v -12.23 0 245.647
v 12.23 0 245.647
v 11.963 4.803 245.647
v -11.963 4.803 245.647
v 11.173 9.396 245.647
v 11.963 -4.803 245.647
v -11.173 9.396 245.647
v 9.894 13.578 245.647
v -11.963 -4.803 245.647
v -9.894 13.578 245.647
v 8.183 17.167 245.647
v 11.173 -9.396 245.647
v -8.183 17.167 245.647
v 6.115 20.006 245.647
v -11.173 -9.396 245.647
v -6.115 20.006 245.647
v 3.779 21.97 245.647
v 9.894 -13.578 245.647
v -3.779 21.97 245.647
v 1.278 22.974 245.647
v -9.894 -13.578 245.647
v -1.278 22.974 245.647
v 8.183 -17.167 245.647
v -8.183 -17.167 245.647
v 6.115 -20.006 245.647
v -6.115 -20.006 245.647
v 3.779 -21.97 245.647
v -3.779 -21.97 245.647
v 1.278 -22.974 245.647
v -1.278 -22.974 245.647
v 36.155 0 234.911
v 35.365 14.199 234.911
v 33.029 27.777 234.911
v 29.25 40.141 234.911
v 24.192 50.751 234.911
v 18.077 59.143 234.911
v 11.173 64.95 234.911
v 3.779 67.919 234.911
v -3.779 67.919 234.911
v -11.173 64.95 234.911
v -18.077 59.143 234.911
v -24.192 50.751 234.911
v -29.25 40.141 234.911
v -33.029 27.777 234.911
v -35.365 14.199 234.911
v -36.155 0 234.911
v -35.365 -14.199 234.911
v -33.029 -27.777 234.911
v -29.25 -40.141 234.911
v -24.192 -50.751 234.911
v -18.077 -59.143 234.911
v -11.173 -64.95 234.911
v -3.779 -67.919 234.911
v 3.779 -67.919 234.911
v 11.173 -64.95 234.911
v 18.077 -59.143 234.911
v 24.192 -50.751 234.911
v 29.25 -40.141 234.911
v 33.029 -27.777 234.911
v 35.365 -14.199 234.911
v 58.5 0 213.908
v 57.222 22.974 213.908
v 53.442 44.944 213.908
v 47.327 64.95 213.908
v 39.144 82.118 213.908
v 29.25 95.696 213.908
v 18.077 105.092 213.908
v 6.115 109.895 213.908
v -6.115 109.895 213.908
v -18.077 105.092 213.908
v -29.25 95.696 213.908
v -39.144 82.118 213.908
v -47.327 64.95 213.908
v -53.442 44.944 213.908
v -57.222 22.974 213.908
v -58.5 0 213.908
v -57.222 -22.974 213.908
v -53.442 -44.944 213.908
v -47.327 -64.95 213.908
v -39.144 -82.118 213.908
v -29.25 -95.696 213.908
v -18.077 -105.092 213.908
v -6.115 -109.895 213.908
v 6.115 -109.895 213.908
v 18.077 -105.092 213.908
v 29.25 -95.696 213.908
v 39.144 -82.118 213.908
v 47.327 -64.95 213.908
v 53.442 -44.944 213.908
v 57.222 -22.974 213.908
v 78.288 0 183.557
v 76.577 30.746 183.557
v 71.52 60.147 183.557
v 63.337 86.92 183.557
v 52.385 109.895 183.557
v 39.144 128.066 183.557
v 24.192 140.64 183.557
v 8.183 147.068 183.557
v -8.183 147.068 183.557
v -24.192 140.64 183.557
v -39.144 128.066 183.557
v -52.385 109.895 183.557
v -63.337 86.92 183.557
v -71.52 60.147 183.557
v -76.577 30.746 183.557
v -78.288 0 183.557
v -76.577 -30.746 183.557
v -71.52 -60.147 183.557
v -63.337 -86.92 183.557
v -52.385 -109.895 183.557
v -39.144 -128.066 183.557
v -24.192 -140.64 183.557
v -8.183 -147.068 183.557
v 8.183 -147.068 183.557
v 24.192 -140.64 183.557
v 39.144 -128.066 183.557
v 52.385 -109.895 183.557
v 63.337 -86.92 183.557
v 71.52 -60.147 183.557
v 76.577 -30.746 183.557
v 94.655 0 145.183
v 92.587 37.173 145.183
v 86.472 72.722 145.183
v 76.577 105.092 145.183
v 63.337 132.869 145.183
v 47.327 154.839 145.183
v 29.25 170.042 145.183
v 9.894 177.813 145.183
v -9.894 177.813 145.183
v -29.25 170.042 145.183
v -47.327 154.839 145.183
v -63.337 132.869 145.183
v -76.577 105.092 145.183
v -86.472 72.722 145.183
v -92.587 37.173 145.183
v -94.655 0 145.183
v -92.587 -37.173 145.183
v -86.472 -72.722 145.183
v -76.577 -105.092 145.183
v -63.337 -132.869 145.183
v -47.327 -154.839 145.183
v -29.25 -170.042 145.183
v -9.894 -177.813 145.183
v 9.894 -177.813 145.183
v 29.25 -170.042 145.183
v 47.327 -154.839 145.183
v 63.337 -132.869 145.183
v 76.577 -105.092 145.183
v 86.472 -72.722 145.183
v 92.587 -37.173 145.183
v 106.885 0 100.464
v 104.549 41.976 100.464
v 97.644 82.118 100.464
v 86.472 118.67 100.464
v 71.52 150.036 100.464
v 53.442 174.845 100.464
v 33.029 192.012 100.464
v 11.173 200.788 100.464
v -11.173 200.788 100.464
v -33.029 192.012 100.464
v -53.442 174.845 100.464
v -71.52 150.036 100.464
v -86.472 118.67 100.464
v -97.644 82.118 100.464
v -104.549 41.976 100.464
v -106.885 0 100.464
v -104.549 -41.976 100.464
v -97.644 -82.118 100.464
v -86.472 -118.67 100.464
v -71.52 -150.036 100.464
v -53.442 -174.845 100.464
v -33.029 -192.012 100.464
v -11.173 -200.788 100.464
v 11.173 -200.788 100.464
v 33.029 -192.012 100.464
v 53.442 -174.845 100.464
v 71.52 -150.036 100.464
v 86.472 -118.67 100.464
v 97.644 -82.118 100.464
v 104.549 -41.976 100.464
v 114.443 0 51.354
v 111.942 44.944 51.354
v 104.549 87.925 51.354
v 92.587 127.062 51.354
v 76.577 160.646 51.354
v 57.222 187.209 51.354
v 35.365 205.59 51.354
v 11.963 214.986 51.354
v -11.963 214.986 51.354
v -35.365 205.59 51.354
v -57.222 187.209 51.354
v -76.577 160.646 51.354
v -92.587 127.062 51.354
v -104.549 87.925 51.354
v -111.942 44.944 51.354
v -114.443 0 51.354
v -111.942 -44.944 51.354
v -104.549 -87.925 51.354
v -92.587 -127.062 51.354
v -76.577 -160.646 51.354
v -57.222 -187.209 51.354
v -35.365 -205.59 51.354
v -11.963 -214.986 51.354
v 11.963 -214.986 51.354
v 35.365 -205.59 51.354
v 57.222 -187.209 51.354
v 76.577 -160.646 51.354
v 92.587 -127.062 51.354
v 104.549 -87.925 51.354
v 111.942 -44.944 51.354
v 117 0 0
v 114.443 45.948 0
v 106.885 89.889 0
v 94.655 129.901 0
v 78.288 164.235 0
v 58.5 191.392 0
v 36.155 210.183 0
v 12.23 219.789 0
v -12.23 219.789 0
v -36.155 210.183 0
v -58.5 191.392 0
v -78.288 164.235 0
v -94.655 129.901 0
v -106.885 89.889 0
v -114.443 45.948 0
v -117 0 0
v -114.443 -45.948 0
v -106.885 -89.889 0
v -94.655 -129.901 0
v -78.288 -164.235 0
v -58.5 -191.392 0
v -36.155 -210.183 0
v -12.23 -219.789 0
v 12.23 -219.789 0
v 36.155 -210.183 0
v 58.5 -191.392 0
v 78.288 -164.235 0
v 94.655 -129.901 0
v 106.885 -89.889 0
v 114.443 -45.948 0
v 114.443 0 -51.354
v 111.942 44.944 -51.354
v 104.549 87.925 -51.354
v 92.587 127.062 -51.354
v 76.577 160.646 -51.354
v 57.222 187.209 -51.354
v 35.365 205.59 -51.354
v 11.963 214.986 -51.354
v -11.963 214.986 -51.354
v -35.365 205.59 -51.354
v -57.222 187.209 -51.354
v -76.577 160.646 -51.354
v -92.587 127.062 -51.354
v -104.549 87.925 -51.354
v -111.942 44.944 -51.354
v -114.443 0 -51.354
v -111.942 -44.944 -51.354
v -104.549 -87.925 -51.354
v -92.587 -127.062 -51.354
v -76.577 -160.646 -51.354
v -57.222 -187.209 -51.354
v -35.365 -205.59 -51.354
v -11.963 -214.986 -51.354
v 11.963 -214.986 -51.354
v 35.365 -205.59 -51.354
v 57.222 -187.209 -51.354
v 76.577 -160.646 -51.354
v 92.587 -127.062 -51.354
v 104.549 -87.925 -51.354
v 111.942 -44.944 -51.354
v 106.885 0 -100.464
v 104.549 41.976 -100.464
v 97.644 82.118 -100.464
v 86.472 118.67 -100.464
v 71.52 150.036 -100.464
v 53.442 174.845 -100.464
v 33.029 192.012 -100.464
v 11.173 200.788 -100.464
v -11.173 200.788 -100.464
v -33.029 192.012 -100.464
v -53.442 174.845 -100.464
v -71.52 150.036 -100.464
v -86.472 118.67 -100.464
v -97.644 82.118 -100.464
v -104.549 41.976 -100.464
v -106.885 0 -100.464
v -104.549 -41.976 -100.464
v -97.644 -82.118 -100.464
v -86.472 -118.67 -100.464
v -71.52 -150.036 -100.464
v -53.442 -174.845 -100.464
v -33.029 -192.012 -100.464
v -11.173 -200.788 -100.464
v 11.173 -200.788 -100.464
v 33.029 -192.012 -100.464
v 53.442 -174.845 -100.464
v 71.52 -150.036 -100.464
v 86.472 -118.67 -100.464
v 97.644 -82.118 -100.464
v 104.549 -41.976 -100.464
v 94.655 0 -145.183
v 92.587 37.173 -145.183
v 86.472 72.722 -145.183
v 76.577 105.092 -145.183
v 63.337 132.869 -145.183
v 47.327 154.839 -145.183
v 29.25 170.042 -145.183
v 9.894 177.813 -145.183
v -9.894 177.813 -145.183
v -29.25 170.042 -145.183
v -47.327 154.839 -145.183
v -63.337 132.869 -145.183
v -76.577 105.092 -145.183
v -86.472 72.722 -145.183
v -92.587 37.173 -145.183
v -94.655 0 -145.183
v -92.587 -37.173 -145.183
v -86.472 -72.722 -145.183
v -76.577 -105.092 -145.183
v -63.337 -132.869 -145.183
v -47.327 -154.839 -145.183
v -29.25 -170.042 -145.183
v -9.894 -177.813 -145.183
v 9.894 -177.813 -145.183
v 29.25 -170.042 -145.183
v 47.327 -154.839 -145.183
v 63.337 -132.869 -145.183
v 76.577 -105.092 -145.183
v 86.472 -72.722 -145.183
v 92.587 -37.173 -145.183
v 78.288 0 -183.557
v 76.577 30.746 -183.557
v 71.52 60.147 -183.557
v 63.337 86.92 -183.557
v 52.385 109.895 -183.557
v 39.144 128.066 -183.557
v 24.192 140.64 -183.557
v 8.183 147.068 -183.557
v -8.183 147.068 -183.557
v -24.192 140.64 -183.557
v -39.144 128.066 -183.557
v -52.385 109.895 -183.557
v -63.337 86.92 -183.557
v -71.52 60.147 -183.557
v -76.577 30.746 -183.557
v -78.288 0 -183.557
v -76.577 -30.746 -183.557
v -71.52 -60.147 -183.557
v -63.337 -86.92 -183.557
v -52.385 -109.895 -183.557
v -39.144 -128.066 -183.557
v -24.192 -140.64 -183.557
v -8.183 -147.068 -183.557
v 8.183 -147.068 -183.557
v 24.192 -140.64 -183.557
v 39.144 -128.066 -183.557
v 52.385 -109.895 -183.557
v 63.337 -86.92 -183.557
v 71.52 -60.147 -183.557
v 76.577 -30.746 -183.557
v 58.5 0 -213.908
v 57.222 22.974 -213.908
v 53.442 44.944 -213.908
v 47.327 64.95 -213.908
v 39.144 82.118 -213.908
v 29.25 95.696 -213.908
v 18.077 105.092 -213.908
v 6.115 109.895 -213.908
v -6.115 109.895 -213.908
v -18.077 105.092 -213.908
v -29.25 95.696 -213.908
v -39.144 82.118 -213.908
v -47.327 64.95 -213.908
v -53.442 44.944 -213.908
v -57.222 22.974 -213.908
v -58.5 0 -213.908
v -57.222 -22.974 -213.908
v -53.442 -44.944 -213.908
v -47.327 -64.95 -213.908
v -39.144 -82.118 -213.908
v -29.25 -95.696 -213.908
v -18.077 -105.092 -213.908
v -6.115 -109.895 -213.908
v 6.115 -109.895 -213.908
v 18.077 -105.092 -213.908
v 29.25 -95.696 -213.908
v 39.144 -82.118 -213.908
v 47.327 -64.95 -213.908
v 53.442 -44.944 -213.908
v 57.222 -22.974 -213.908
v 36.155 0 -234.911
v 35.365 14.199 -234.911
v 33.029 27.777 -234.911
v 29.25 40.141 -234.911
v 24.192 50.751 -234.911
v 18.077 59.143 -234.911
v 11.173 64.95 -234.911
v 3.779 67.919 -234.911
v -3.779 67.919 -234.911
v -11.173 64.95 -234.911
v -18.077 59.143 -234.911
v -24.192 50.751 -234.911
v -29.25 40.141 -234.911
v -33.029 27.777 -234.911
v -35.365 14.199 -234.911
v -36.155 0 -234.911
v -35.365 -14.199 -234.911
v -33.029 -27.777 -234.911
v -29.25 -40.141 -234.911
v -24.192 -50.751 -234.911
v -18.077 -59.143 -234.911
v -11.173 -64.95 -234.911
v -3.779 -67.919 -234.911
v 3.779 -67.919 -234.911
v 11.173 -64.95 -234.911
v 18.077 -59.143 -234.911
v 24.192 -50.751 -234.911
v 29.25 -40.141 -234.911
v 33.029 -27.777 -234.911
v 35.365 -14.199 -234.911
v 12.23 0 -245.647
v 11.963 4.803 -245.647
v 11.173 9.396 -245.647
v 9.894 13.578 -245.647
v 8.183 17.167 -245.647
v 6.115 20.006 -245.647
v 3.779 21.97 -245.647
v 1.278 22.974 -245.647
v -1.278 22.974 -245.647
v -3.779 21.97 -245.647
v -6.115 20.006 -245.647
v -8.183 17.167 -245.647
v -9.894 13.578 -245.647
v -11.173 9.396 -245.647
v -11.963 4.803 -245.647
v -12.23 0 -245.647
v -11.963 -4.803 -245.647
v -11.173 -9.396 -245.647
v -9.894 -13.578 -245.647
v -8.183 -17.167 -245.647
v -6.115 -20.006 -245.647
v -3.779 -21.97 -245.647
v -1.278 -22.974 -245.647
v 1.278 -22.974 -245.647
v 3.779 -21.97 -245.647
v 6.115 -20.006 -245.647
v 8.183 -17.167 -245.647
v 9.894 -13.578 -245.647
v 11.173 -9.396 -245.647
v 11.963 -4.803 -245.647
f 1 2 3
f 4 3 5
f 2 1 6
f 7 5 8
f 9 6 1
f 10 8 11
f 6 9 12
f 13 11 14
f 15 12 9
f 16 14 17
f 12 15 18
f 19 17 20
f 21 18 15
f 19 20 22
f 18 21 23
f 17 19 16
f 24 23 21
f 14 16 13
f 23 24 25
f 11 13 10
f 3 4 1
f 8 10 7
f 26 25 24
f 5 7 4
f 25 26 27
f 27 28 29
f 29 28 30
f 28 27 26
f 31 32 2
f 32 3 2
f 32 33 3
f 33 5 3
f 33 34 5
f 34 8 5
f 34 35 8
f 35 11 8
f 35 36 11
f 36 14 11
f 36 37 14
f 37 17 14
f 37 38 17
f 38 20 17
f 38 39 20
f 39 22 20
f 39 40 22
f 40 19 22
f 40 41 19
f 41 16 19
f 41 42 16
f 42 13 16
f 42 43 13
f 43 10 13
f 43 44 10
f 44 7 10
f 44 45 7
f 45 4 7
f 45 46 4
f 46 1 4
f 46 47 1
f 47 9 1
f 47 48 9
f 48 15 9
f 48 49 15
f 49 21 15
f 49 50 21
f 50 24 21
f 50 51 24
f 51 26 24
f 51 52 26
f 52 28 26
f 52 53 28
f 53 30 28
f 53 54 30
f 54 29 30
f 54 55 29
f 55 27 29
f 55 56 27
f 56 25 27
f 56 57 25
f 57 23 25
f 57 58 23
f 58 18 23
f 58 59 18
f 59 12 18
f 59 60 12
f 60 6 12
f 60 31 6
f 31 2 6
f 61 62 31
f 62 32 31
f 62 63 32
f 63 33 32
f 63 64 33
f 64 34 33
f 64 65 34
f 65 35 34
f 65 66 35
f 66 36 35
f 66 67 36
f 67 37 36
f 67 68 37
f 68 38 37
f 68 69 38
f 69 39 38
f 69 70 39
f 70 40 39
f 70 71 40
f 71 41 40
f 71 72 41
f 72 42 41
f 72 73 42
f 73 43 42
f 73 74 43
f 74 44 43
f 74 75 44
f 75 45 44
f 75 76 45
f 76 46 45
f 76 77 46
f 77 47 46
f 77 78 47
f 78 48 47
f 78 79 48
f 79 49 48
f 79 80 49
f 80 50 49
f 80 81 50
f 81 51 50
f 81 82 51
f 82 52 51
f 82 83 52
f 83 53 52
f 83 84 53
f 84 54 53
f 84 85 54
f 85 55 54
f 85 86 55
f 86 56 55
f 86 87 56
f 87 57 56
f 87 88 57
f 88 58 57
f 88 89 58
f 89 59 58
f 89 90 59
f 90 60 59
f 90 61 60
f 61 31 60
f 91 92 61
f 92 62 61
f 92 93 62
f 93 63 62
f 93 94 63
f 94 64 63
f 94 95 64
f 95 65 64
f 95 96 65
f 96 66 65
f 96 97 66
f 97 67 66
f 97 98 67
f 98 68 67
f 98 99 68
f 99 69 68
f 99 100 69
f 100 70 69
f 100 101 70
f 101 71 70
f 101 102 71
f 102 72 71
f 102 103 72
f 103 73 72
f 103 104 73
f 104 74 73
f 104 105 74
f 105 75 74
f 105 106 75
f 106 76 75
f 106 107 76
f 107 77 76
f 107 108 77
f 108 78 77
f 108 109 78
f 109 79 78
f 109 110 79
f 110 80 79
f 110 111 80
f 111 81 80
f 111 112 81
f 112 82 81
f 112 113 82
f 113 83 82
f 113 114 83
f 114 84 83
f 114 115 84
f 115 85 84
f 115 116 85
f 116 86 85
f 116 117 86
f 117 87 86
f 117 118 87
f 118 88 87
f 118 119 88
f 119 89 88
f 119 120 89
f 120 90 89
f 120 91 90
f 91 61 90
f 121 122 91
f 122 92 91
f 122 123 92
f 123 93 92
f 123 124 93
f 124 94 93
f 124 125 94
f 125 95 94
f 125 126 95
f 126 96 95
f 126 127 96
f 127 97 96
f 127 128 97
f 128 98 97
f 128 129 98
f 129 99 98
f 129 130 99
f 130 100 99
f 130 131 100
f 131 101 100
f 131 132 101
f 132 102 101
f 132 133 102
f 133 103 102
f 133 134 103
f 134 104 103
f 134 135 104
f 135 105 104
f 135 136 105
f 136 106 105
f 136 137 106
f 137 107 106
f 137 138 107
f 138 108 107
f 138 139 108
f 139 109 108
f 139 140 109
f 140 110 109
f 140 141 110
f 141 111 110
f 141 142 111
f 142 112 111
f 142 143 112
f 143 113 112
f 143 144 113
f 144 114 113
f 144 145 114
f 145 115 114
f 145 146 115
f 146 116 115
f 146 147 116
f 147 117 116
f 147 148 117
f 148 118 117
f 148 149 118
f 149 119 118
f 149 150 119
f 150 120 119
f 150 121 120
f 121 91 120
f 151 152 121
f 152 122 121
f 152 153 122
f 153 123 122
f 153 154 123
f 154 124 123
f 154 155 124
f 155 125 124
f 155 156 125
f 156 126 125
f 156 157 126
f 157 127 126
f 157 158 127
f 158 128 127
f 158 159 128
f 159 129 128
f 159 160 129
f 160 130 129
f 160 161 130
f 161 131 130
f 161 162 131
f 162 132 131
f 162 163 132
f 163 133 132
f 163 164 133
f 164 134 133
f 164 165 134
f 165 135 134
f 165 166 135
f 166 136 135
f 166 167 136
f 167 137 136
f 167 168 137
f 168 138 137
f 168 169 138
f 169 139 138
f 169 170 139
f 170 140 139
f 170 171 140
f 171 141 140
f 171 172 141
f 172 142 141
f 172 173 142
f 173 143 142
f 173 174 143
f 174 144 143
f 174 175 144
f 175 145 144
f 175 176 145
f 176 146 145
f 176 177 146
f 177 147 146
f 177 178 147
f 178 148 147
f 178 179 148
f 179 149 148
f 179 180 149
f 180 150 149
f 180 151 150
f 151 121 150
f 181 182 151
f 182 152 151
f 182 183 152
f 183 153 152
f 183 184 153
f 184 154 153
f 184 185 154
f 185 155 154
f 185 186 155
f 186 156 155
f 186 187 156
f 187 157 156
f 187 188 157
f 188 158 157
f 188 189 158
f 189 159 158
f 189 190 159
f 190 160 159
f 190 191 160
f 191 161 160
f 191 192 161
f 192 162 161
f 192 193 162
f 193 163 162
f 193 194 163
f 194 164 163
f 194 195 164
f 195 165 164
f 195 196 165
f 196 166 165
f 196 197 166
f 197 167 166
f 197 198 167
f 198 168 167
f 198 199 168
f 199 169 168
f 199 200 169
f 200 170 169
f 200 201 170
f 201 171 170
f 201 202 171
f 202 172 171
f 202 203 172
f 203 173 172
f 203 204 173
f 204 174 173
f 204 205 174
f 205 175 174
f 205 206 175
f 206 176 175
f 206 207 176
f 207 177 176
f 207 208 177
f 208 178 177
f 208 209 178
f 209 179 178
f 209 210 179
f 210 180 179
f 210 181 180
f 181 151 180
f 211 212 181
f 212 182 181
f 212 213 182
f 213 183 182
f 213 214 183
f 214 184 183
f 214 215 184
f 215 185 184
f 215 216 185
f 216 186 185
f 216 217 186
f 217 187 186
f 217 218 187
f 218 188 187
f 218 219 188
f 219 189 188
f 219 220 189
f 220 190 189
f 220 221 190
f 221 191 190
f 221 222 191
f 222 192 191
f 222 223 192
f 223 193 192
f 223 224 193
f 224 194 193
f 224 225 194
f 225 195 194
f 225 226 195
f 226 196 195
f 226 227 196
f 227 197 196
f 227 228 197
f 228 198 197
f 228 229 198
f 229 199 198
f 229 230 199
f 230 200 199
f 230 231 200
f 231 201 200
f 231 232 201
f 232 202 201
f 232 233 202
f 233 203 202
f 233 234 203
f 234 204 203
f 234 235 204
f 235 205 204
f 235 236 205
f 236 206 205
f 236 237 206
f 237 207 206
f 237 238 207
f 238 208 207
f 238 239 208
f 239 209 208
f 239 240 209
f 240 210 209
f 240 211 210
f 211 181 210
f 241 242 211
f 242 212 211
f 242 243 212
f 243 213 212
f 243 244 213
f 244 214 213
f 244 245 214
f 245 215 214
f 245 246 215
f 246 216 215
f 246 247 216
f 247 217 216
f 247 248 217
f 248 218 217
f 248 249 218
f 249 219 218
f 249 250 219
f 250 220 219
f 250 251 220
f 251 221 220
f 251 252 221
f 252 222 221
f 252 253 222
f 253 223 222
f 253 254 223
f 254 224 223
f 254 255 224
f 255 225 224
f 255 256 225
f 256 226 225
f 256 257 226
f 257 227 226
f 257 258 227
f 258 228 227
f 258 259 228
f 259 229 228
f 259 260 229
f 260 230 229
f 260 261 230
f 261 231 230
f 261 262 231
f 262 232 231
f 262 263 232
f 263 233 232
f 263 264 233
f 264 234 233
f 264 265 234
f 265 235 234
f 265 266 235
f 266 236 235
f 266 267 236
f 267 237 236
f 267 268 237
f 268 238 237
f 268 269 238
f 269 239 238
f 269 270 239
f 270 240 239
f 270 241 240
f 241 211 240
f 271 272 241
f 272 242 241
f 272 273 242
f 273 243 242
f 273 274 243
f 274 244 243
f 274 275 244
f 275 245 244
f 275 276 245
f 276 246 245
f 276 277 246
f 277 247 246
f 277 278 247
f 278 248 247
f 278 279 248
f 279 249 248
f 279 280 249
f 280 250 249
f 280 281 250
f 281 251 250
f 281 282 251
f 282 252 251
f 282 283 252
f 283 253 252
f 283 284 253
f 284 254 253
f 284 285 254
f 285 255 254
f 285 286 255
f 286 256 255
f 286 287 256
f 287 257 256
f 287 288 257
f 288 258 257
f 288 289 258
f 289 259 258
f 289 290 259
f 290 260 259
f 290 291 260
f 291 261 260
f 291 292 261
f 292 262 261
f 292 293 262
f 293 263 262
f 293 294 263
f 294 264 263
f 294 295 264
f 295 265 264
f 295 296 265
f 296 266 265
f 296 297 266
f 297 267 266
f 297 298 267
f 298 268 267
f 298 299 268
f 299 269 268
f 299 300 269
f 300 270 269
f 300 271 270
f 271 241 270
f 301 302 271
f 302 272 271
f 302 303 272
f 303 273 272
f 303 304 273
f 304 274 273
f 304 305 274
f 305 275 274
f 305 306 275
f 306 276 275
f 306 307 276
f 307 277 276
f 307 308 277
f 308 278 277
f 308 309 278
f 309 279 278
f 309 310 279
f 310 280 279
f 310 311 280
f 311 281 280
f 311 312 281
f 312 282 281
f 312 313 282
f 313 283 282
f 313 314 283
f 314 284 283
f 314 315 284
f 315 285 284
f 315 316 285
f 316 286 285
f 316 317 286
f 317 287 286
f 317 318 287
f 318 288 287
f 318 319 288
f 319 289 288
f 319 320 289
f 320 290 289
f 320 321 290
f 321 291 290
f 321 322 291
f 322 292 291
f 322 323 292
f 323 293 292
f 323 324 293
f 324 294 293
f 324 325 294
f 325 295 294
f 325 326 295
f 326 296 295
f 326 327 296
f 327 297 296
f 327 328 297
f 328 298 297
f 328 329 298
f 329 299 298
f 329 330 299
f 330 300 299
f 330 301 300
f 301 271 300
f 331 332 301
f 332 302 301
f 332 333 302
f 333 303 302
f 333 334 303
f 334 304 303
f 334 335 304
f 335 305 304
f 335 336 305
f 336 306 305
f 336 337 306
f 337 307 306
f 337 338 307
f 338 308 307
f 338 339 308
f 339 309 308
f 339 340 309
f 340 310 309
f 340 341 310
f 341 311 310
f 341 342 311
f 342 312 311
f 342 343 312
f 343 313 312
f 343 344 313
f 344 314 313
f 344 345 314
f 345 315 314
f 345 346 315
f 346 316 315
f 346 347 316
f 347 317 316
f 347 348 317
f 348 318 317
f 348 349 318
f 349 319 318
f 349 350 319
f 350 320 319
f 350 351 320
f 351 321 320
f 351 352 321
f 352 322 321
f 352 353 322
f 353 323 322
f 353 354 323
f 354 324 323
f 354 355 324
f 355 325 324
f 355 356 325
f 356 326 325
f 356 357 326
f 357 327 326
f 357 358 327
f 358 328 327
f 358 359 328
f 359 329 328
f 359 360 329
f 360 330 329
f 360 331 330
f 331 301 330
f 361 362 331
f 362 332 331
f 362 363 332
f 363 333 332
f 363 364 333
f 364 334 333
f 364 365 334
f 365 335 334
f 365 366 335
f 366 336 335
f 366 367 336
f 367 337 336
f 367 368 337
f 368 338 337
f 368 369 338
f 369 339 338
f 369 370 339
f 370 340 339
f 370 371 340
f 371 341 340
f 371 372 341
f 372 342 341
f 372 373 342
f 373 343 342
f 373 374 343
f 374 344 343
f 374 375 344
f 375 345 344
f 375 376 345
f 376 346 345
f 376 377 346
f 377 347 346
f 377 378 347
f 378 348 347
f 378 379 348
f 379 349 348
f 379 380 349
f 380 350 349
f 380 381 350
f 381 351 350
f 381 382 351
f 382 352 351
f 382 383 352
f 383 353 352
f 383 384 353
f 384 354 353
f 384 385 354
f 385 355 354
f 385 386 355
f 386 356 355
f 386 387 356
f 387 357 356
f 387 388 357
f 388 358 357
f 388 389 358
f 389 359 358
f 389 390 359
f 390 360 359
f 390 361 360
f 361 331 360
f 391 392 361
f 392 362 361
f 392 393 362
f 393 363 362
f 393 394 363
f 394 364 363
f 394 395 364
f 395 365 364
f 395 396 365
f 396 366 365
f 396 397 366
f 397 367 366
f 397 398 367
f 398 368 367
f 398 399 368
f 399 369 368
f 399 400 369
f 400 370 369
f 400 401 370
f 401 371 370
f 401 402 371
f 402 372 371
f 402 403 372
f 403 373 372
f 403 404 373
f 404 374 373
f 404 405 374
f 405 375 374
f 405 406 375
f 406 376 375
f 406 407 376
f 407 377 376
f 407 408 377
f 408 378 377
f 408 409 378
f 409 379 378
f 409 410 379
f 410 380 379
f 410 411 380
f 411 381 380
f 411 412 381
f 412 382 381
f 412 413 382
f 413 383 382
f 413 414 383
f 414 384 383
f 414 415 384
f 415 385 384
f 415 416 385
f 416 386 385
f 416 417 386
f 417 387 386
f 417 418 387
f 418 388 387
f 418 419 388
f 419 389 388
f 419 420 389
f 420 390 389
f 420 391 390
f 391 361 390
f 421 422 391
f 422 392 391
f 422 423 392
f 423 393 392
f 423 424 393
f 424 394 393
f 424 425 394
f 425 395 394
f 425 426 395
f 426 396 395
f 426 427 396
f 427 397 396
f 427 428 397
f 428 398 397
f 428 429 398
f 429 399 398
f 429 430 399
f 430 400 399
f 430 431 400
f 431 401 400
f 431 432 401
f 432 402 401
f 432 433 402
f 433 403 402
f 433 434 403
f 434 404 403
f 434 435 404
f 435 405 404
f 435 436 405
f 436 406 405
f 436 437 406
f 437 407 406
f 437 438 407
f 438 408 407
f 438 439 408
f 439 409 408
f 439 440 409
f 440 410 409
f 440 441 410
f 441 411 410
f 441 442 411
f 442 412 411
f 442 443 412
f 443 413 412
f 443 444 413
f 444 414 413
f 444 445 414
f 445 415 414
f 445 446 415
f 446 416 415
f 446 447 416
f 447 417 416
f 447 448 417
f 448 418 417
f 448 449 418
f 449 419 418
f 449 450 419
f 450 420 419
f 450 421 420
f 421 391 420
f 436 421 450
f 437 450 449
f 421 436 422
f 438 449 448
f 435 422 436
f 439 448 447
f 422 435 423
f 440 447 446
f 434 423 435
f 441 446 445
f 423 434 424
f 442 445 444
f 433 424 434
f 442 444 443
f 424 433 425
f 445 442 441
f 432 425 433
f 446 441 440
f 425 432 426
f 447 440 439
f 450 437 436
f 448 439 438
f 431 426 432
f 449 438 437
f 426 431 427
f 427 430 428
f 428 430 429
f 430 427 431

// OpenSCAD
// Generated by SolidPython 1.0.1 on 2020-07-29 00:46:49


scale(v = [9, 17, 19]) {
	sphere(r = 13);
}
/***********************************************
*********      SolidPython code:      **********
************************************************
 
# import packages: SolidPython
from solid import *
from solid.utils import *
from itertools import chain, combinations, permutations


class Resize:

    def __init__(self, scad_file):
        self.scad_file = scad_file
        #self.scad_file = import_scad(scad_file)
        # cone/cylinder param:
        self.r1 = 0
        self.r2 = 0
        self.h = 0
        # rectangular prism param:
        self.w = 0
        self.l = 0
        # ellipse param:
        self.r = 0

    # import OpenScad code (file name corresponds to shape)


    # classify shape + parameters
    def assign(self, param1, param2, param3):
        if self.scad_file == 'cone.scad':
            self.r1 = param1
            self.r2 = param2
            self.h = param3
        elif self.scad_file == 'cylinder.scad':
            self.r1 = param1
            self.r2 = param2
            self.h = param3
        elif self.scad_file == 'rectangularPrism.scad':
            self.h = param1
            self.l = param2
            self.w = param3
        else:
            self.r = param1
            self.h = param2

    # resize parameters
    def iterate(self):
        x = range(3, 20, 2)
        i = 1
        if self.scad_file == 'cone.scad':
            tempList = list(permutations(x, 2))
            for temp in tempList:
                param1 = temp[0]
                param2 = temp[1]
                filepath = 'produced_scad_files/' + 'cone' + str(param1) + '_' + str(param2) + '_' + '.scad'
                scad_render_to_file(cylinder(h=param1, r1=param2, r2=0), filepath)

        elif self.scad_file == 'cylinder.scad':
            tempList = list(permutations(x, 3))
            for temp in tempList:
                param1 = temp[0]
                param2 = temp[1]
                filepath = 'produced_scad_files/' + 'cylinder' + str(param1) + '_' + str(param2) + '_' + '.scad'
                scad_render_to_file(cylinder(h=param1, r1=param2, r2=param2), filepath)

        elif self.scad_file == 'rectangularPrism.scad':
            tempList = list(permutations(x, 3))
            for temp in tempList:
                param1 = temp[0]
                param2 = temp[1]
                param3 = temp[2]
                filepath = 'produced_scad_files/' + 'rectangularPrism' + str(param1) + '_' + str(param2) + '_' + str(
                    param3) + '.scad'
                scad_render_to_file(cube(size=(param1, param2, param3)), filepath)

        elif self.scad_file == 'ellipse.scad':
            tempList = list(permutations(x, 4))
            for temp in tempList:
                param1 = temp[0]
                param2 = temp[1]
                param3 = temp[2]
                param4 = temp[3]
                filepath = 'produced_scad_files/' + 'ellipse' + str(param1) + '_' + str(param2) + '_' + str(param3) + '_' + str(param4) + '.scad'
                scad_render_to_file(scale([param1, param2, param3])(sphere(r=param4)), filepath)

    def render_to_scadfile(self):
        scad_render_to_file(scad, 'example.scad') 
 
************************************************/
